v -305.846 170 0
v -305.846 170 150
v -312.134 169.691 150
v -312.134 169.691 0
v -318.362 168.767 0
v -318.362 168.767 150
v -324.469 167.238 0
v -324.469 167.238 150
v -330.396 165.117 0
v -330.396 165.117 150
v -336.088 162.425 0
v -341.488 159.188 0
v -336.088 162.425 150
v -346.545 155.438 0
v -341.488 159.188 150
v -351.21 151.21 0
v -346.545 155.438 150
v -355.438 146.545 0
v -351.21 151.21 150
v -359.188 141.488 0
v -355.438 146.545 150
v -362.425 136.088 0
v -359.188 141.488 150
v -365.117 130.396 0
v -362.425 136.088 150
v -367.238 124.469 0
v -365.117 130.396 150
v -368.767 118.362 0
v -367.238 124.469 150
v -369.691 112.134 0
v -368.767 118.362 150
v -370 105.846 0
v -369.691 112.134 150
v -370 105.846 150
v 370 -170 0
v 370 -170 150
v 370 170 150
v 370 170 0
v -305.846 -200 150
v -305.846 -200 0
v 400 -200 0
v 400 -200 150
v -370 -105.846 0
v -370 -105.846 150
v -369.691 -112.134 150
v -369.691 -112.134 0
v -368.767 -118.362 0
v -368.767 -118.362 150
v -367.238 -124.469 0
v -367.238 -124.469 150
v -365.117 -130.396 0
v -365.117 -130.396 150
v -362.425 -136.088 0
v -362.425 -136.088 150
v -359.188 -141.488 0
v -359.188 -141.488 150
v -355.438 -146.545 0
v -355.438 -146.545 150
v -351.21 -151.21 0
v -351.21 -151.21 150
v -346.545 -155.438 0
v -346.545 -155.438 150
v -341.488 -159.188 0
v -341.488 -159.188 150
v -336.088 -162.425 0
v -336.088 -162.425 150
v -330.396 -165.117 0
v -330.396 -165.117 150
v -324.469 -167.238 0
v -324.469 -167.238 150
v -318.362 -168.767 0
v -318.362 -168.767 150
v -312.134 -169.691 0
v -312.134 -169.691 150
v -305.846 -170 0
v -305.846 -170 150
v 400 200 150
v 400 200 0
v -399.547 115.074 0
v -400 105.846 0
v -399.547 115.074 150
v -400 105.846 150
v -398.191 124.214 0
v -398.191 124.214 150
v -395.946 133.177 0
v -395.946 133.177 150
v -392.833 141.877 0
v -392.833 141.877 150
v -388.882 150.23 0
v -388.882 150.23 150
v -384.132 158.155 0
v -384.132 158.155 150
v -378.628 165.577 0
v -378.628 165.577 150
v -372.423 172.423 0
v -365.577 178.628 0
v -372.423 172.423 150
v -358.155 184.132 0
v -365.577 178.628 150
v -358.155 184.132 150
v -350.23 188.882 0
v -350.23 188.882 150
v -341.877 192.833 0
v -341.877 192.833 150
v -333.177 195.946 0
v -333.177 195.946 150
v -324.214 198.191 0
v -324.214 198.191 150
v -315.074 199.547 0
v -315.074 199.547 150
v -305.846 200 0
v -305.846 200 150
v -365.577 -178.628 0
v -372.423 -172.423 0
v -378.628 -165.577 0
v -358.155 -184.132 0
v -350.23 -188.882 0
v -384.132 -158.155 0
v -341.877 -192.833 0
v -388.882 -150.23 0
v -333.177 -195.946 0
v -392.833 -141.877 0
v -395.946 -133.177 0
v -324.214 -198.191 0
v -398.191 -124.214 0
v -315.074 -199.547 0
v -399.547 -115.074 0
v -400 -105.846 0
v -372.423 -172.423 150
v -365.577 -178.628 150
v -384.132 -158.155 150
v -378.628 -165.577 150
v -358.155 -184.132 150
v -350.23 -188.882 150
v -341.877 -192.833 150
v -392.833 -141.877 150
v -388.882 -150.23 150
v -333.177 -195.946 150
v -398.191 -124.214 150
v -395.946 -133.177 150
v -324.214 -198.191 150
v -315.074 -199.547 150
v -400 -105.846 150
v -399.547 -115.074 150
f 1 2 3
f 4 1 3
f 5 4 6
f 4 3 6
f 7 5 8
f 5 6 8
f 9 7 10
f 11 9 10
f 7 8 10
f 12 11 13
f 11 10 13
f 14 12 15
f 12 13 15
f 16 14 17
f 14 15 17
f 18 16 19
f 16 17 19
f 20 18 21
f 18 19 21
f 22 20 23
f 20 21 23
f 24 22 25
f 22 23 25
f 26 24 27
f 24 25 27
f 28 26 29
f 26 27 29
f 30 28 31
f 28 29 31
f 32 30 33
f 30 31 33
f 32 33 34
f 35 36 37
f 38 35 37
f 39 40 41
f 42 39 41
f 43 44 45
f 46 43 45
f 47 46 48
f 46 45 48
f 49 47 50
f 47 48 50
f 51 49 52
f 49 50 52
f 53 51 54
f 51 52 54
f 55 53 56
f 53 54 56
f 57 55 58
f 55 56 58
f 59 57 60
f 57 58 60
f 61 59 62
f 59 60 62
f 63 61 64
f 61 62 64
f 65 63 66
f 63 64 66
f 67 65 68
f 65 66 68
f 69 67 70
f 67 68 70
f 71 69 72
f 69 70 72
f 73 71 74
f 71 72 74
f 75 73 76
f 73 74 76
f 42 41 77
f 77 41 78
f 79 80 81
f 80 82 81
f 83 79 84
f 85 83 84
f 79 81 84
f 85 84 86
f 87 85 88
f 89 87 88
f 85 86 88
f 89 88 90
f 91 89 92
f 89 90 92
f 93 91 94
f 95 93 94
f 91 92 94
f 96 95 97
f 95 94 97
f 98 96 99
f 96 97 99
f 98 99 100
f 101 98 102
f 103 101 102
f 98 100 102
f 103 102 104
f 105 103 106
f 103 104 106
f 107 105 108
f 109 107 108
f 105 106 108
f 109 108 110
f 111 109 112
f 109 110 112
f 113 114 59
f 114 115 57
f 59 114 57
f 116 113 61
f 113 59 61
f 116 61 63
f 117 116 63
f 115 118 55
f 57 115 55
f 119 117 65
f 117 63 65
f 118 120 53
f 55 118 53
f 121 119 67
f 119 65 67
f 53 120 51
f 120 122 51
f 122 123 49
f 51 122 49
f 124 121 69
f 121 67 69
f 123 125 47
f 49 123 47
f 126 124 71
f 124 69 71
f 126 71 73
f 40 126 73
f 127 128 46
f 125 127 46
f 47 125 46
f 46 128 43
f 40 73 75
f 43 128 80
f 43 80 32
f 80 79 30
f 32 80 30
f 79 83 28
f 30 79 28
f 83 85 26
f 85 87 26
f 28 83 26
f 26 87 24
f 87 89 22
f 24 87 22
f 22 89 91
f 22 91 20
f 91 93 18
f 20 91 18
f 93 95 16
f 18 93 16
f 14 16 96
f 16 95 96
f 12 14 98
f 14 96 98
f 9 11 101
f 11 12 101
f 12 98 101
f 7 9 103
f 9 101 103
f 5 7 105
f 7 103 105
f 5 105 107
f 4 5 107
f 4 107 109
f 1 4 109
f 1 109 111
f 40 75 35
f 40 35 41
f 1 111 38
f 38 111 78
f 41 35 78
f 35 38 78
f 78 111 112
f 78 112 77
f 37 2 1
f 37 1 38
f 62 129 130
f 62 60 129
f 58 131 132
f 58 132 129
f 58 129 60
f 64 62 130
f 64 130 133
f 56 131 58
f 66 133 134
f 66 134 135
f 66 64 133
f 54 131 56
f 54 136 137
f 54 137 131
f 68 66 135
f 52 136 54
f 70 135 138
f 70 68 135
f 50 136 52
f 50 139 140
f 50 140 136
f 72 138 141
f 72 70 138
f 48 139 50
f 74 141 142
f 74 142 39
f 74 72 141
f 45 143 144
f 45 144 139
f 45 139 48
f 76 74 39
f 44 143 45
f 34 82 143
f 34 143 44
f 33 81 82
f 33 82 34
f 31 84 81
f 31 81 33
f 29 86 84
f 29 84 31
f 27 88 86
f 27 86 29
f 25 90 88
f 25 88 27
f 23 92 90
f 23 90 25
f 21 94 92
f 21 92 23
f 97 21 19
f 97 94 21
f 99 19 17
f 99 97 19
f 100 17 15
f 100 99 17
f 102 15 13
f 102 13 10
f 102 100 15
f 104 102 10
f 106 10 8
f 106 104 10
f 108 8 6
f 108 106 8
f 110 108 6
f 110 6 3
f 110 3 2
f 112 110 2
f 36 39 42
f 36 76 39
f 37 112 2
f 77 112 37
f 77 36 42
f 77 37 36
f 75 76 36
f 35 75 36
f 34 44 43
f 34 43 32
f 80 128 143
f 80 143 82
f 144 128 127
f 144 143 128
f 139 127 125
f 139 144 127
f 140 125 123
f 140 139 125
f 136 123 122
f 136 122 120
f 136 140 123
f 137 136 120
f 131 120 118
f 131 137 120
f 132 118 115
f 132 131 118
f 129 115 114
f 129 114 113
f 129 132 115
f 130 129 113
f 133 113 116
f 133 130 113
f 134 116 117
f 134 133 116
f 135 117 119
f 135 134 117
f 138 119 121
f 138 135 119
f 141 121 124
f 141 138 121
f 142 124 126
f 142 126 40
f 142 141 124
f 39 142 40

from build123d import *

# Parameters (mm, degrees)
F0_W     = 800
F0_H     = 400
F1_DEPTH = 150
F2_R     = 94.1543289326
F3_T     = -30
F4_DEPTH = 202


with BuildPart() as f1:
    # F0 (on Top) → F1 (new body)
    with BuildSketch(Plane.XY):
        Rectangle(F0_W, F0_H)
    extrude(amount=F1_DEPTH)

    # F2
    f2_edges = [f1.edges().sort_by_distance(p)[0] for p in [
        (-400, 200, 75),
        (-400, -200, 75),
    ]]
    fillet(f2_edges, radius=F2_R)

    # F3
    f3_openings = [f1.faces().sort_by_distance(p)[0] for p in [
        (4.56029, 0, 150),
    ]]
    offset(amount=F3_T, openings=f3_openings)

    # F4 (cut): a face of the model
    f4_faces = [f1.faces().sort_by_distance(p)[0] for p in [
        (2.5148489981, 0, 30),
    ]]
    extrude(f4_faces, amount=-F4_DEPTH, mode=Mode.SUBTRACT)


solid = f1.part
